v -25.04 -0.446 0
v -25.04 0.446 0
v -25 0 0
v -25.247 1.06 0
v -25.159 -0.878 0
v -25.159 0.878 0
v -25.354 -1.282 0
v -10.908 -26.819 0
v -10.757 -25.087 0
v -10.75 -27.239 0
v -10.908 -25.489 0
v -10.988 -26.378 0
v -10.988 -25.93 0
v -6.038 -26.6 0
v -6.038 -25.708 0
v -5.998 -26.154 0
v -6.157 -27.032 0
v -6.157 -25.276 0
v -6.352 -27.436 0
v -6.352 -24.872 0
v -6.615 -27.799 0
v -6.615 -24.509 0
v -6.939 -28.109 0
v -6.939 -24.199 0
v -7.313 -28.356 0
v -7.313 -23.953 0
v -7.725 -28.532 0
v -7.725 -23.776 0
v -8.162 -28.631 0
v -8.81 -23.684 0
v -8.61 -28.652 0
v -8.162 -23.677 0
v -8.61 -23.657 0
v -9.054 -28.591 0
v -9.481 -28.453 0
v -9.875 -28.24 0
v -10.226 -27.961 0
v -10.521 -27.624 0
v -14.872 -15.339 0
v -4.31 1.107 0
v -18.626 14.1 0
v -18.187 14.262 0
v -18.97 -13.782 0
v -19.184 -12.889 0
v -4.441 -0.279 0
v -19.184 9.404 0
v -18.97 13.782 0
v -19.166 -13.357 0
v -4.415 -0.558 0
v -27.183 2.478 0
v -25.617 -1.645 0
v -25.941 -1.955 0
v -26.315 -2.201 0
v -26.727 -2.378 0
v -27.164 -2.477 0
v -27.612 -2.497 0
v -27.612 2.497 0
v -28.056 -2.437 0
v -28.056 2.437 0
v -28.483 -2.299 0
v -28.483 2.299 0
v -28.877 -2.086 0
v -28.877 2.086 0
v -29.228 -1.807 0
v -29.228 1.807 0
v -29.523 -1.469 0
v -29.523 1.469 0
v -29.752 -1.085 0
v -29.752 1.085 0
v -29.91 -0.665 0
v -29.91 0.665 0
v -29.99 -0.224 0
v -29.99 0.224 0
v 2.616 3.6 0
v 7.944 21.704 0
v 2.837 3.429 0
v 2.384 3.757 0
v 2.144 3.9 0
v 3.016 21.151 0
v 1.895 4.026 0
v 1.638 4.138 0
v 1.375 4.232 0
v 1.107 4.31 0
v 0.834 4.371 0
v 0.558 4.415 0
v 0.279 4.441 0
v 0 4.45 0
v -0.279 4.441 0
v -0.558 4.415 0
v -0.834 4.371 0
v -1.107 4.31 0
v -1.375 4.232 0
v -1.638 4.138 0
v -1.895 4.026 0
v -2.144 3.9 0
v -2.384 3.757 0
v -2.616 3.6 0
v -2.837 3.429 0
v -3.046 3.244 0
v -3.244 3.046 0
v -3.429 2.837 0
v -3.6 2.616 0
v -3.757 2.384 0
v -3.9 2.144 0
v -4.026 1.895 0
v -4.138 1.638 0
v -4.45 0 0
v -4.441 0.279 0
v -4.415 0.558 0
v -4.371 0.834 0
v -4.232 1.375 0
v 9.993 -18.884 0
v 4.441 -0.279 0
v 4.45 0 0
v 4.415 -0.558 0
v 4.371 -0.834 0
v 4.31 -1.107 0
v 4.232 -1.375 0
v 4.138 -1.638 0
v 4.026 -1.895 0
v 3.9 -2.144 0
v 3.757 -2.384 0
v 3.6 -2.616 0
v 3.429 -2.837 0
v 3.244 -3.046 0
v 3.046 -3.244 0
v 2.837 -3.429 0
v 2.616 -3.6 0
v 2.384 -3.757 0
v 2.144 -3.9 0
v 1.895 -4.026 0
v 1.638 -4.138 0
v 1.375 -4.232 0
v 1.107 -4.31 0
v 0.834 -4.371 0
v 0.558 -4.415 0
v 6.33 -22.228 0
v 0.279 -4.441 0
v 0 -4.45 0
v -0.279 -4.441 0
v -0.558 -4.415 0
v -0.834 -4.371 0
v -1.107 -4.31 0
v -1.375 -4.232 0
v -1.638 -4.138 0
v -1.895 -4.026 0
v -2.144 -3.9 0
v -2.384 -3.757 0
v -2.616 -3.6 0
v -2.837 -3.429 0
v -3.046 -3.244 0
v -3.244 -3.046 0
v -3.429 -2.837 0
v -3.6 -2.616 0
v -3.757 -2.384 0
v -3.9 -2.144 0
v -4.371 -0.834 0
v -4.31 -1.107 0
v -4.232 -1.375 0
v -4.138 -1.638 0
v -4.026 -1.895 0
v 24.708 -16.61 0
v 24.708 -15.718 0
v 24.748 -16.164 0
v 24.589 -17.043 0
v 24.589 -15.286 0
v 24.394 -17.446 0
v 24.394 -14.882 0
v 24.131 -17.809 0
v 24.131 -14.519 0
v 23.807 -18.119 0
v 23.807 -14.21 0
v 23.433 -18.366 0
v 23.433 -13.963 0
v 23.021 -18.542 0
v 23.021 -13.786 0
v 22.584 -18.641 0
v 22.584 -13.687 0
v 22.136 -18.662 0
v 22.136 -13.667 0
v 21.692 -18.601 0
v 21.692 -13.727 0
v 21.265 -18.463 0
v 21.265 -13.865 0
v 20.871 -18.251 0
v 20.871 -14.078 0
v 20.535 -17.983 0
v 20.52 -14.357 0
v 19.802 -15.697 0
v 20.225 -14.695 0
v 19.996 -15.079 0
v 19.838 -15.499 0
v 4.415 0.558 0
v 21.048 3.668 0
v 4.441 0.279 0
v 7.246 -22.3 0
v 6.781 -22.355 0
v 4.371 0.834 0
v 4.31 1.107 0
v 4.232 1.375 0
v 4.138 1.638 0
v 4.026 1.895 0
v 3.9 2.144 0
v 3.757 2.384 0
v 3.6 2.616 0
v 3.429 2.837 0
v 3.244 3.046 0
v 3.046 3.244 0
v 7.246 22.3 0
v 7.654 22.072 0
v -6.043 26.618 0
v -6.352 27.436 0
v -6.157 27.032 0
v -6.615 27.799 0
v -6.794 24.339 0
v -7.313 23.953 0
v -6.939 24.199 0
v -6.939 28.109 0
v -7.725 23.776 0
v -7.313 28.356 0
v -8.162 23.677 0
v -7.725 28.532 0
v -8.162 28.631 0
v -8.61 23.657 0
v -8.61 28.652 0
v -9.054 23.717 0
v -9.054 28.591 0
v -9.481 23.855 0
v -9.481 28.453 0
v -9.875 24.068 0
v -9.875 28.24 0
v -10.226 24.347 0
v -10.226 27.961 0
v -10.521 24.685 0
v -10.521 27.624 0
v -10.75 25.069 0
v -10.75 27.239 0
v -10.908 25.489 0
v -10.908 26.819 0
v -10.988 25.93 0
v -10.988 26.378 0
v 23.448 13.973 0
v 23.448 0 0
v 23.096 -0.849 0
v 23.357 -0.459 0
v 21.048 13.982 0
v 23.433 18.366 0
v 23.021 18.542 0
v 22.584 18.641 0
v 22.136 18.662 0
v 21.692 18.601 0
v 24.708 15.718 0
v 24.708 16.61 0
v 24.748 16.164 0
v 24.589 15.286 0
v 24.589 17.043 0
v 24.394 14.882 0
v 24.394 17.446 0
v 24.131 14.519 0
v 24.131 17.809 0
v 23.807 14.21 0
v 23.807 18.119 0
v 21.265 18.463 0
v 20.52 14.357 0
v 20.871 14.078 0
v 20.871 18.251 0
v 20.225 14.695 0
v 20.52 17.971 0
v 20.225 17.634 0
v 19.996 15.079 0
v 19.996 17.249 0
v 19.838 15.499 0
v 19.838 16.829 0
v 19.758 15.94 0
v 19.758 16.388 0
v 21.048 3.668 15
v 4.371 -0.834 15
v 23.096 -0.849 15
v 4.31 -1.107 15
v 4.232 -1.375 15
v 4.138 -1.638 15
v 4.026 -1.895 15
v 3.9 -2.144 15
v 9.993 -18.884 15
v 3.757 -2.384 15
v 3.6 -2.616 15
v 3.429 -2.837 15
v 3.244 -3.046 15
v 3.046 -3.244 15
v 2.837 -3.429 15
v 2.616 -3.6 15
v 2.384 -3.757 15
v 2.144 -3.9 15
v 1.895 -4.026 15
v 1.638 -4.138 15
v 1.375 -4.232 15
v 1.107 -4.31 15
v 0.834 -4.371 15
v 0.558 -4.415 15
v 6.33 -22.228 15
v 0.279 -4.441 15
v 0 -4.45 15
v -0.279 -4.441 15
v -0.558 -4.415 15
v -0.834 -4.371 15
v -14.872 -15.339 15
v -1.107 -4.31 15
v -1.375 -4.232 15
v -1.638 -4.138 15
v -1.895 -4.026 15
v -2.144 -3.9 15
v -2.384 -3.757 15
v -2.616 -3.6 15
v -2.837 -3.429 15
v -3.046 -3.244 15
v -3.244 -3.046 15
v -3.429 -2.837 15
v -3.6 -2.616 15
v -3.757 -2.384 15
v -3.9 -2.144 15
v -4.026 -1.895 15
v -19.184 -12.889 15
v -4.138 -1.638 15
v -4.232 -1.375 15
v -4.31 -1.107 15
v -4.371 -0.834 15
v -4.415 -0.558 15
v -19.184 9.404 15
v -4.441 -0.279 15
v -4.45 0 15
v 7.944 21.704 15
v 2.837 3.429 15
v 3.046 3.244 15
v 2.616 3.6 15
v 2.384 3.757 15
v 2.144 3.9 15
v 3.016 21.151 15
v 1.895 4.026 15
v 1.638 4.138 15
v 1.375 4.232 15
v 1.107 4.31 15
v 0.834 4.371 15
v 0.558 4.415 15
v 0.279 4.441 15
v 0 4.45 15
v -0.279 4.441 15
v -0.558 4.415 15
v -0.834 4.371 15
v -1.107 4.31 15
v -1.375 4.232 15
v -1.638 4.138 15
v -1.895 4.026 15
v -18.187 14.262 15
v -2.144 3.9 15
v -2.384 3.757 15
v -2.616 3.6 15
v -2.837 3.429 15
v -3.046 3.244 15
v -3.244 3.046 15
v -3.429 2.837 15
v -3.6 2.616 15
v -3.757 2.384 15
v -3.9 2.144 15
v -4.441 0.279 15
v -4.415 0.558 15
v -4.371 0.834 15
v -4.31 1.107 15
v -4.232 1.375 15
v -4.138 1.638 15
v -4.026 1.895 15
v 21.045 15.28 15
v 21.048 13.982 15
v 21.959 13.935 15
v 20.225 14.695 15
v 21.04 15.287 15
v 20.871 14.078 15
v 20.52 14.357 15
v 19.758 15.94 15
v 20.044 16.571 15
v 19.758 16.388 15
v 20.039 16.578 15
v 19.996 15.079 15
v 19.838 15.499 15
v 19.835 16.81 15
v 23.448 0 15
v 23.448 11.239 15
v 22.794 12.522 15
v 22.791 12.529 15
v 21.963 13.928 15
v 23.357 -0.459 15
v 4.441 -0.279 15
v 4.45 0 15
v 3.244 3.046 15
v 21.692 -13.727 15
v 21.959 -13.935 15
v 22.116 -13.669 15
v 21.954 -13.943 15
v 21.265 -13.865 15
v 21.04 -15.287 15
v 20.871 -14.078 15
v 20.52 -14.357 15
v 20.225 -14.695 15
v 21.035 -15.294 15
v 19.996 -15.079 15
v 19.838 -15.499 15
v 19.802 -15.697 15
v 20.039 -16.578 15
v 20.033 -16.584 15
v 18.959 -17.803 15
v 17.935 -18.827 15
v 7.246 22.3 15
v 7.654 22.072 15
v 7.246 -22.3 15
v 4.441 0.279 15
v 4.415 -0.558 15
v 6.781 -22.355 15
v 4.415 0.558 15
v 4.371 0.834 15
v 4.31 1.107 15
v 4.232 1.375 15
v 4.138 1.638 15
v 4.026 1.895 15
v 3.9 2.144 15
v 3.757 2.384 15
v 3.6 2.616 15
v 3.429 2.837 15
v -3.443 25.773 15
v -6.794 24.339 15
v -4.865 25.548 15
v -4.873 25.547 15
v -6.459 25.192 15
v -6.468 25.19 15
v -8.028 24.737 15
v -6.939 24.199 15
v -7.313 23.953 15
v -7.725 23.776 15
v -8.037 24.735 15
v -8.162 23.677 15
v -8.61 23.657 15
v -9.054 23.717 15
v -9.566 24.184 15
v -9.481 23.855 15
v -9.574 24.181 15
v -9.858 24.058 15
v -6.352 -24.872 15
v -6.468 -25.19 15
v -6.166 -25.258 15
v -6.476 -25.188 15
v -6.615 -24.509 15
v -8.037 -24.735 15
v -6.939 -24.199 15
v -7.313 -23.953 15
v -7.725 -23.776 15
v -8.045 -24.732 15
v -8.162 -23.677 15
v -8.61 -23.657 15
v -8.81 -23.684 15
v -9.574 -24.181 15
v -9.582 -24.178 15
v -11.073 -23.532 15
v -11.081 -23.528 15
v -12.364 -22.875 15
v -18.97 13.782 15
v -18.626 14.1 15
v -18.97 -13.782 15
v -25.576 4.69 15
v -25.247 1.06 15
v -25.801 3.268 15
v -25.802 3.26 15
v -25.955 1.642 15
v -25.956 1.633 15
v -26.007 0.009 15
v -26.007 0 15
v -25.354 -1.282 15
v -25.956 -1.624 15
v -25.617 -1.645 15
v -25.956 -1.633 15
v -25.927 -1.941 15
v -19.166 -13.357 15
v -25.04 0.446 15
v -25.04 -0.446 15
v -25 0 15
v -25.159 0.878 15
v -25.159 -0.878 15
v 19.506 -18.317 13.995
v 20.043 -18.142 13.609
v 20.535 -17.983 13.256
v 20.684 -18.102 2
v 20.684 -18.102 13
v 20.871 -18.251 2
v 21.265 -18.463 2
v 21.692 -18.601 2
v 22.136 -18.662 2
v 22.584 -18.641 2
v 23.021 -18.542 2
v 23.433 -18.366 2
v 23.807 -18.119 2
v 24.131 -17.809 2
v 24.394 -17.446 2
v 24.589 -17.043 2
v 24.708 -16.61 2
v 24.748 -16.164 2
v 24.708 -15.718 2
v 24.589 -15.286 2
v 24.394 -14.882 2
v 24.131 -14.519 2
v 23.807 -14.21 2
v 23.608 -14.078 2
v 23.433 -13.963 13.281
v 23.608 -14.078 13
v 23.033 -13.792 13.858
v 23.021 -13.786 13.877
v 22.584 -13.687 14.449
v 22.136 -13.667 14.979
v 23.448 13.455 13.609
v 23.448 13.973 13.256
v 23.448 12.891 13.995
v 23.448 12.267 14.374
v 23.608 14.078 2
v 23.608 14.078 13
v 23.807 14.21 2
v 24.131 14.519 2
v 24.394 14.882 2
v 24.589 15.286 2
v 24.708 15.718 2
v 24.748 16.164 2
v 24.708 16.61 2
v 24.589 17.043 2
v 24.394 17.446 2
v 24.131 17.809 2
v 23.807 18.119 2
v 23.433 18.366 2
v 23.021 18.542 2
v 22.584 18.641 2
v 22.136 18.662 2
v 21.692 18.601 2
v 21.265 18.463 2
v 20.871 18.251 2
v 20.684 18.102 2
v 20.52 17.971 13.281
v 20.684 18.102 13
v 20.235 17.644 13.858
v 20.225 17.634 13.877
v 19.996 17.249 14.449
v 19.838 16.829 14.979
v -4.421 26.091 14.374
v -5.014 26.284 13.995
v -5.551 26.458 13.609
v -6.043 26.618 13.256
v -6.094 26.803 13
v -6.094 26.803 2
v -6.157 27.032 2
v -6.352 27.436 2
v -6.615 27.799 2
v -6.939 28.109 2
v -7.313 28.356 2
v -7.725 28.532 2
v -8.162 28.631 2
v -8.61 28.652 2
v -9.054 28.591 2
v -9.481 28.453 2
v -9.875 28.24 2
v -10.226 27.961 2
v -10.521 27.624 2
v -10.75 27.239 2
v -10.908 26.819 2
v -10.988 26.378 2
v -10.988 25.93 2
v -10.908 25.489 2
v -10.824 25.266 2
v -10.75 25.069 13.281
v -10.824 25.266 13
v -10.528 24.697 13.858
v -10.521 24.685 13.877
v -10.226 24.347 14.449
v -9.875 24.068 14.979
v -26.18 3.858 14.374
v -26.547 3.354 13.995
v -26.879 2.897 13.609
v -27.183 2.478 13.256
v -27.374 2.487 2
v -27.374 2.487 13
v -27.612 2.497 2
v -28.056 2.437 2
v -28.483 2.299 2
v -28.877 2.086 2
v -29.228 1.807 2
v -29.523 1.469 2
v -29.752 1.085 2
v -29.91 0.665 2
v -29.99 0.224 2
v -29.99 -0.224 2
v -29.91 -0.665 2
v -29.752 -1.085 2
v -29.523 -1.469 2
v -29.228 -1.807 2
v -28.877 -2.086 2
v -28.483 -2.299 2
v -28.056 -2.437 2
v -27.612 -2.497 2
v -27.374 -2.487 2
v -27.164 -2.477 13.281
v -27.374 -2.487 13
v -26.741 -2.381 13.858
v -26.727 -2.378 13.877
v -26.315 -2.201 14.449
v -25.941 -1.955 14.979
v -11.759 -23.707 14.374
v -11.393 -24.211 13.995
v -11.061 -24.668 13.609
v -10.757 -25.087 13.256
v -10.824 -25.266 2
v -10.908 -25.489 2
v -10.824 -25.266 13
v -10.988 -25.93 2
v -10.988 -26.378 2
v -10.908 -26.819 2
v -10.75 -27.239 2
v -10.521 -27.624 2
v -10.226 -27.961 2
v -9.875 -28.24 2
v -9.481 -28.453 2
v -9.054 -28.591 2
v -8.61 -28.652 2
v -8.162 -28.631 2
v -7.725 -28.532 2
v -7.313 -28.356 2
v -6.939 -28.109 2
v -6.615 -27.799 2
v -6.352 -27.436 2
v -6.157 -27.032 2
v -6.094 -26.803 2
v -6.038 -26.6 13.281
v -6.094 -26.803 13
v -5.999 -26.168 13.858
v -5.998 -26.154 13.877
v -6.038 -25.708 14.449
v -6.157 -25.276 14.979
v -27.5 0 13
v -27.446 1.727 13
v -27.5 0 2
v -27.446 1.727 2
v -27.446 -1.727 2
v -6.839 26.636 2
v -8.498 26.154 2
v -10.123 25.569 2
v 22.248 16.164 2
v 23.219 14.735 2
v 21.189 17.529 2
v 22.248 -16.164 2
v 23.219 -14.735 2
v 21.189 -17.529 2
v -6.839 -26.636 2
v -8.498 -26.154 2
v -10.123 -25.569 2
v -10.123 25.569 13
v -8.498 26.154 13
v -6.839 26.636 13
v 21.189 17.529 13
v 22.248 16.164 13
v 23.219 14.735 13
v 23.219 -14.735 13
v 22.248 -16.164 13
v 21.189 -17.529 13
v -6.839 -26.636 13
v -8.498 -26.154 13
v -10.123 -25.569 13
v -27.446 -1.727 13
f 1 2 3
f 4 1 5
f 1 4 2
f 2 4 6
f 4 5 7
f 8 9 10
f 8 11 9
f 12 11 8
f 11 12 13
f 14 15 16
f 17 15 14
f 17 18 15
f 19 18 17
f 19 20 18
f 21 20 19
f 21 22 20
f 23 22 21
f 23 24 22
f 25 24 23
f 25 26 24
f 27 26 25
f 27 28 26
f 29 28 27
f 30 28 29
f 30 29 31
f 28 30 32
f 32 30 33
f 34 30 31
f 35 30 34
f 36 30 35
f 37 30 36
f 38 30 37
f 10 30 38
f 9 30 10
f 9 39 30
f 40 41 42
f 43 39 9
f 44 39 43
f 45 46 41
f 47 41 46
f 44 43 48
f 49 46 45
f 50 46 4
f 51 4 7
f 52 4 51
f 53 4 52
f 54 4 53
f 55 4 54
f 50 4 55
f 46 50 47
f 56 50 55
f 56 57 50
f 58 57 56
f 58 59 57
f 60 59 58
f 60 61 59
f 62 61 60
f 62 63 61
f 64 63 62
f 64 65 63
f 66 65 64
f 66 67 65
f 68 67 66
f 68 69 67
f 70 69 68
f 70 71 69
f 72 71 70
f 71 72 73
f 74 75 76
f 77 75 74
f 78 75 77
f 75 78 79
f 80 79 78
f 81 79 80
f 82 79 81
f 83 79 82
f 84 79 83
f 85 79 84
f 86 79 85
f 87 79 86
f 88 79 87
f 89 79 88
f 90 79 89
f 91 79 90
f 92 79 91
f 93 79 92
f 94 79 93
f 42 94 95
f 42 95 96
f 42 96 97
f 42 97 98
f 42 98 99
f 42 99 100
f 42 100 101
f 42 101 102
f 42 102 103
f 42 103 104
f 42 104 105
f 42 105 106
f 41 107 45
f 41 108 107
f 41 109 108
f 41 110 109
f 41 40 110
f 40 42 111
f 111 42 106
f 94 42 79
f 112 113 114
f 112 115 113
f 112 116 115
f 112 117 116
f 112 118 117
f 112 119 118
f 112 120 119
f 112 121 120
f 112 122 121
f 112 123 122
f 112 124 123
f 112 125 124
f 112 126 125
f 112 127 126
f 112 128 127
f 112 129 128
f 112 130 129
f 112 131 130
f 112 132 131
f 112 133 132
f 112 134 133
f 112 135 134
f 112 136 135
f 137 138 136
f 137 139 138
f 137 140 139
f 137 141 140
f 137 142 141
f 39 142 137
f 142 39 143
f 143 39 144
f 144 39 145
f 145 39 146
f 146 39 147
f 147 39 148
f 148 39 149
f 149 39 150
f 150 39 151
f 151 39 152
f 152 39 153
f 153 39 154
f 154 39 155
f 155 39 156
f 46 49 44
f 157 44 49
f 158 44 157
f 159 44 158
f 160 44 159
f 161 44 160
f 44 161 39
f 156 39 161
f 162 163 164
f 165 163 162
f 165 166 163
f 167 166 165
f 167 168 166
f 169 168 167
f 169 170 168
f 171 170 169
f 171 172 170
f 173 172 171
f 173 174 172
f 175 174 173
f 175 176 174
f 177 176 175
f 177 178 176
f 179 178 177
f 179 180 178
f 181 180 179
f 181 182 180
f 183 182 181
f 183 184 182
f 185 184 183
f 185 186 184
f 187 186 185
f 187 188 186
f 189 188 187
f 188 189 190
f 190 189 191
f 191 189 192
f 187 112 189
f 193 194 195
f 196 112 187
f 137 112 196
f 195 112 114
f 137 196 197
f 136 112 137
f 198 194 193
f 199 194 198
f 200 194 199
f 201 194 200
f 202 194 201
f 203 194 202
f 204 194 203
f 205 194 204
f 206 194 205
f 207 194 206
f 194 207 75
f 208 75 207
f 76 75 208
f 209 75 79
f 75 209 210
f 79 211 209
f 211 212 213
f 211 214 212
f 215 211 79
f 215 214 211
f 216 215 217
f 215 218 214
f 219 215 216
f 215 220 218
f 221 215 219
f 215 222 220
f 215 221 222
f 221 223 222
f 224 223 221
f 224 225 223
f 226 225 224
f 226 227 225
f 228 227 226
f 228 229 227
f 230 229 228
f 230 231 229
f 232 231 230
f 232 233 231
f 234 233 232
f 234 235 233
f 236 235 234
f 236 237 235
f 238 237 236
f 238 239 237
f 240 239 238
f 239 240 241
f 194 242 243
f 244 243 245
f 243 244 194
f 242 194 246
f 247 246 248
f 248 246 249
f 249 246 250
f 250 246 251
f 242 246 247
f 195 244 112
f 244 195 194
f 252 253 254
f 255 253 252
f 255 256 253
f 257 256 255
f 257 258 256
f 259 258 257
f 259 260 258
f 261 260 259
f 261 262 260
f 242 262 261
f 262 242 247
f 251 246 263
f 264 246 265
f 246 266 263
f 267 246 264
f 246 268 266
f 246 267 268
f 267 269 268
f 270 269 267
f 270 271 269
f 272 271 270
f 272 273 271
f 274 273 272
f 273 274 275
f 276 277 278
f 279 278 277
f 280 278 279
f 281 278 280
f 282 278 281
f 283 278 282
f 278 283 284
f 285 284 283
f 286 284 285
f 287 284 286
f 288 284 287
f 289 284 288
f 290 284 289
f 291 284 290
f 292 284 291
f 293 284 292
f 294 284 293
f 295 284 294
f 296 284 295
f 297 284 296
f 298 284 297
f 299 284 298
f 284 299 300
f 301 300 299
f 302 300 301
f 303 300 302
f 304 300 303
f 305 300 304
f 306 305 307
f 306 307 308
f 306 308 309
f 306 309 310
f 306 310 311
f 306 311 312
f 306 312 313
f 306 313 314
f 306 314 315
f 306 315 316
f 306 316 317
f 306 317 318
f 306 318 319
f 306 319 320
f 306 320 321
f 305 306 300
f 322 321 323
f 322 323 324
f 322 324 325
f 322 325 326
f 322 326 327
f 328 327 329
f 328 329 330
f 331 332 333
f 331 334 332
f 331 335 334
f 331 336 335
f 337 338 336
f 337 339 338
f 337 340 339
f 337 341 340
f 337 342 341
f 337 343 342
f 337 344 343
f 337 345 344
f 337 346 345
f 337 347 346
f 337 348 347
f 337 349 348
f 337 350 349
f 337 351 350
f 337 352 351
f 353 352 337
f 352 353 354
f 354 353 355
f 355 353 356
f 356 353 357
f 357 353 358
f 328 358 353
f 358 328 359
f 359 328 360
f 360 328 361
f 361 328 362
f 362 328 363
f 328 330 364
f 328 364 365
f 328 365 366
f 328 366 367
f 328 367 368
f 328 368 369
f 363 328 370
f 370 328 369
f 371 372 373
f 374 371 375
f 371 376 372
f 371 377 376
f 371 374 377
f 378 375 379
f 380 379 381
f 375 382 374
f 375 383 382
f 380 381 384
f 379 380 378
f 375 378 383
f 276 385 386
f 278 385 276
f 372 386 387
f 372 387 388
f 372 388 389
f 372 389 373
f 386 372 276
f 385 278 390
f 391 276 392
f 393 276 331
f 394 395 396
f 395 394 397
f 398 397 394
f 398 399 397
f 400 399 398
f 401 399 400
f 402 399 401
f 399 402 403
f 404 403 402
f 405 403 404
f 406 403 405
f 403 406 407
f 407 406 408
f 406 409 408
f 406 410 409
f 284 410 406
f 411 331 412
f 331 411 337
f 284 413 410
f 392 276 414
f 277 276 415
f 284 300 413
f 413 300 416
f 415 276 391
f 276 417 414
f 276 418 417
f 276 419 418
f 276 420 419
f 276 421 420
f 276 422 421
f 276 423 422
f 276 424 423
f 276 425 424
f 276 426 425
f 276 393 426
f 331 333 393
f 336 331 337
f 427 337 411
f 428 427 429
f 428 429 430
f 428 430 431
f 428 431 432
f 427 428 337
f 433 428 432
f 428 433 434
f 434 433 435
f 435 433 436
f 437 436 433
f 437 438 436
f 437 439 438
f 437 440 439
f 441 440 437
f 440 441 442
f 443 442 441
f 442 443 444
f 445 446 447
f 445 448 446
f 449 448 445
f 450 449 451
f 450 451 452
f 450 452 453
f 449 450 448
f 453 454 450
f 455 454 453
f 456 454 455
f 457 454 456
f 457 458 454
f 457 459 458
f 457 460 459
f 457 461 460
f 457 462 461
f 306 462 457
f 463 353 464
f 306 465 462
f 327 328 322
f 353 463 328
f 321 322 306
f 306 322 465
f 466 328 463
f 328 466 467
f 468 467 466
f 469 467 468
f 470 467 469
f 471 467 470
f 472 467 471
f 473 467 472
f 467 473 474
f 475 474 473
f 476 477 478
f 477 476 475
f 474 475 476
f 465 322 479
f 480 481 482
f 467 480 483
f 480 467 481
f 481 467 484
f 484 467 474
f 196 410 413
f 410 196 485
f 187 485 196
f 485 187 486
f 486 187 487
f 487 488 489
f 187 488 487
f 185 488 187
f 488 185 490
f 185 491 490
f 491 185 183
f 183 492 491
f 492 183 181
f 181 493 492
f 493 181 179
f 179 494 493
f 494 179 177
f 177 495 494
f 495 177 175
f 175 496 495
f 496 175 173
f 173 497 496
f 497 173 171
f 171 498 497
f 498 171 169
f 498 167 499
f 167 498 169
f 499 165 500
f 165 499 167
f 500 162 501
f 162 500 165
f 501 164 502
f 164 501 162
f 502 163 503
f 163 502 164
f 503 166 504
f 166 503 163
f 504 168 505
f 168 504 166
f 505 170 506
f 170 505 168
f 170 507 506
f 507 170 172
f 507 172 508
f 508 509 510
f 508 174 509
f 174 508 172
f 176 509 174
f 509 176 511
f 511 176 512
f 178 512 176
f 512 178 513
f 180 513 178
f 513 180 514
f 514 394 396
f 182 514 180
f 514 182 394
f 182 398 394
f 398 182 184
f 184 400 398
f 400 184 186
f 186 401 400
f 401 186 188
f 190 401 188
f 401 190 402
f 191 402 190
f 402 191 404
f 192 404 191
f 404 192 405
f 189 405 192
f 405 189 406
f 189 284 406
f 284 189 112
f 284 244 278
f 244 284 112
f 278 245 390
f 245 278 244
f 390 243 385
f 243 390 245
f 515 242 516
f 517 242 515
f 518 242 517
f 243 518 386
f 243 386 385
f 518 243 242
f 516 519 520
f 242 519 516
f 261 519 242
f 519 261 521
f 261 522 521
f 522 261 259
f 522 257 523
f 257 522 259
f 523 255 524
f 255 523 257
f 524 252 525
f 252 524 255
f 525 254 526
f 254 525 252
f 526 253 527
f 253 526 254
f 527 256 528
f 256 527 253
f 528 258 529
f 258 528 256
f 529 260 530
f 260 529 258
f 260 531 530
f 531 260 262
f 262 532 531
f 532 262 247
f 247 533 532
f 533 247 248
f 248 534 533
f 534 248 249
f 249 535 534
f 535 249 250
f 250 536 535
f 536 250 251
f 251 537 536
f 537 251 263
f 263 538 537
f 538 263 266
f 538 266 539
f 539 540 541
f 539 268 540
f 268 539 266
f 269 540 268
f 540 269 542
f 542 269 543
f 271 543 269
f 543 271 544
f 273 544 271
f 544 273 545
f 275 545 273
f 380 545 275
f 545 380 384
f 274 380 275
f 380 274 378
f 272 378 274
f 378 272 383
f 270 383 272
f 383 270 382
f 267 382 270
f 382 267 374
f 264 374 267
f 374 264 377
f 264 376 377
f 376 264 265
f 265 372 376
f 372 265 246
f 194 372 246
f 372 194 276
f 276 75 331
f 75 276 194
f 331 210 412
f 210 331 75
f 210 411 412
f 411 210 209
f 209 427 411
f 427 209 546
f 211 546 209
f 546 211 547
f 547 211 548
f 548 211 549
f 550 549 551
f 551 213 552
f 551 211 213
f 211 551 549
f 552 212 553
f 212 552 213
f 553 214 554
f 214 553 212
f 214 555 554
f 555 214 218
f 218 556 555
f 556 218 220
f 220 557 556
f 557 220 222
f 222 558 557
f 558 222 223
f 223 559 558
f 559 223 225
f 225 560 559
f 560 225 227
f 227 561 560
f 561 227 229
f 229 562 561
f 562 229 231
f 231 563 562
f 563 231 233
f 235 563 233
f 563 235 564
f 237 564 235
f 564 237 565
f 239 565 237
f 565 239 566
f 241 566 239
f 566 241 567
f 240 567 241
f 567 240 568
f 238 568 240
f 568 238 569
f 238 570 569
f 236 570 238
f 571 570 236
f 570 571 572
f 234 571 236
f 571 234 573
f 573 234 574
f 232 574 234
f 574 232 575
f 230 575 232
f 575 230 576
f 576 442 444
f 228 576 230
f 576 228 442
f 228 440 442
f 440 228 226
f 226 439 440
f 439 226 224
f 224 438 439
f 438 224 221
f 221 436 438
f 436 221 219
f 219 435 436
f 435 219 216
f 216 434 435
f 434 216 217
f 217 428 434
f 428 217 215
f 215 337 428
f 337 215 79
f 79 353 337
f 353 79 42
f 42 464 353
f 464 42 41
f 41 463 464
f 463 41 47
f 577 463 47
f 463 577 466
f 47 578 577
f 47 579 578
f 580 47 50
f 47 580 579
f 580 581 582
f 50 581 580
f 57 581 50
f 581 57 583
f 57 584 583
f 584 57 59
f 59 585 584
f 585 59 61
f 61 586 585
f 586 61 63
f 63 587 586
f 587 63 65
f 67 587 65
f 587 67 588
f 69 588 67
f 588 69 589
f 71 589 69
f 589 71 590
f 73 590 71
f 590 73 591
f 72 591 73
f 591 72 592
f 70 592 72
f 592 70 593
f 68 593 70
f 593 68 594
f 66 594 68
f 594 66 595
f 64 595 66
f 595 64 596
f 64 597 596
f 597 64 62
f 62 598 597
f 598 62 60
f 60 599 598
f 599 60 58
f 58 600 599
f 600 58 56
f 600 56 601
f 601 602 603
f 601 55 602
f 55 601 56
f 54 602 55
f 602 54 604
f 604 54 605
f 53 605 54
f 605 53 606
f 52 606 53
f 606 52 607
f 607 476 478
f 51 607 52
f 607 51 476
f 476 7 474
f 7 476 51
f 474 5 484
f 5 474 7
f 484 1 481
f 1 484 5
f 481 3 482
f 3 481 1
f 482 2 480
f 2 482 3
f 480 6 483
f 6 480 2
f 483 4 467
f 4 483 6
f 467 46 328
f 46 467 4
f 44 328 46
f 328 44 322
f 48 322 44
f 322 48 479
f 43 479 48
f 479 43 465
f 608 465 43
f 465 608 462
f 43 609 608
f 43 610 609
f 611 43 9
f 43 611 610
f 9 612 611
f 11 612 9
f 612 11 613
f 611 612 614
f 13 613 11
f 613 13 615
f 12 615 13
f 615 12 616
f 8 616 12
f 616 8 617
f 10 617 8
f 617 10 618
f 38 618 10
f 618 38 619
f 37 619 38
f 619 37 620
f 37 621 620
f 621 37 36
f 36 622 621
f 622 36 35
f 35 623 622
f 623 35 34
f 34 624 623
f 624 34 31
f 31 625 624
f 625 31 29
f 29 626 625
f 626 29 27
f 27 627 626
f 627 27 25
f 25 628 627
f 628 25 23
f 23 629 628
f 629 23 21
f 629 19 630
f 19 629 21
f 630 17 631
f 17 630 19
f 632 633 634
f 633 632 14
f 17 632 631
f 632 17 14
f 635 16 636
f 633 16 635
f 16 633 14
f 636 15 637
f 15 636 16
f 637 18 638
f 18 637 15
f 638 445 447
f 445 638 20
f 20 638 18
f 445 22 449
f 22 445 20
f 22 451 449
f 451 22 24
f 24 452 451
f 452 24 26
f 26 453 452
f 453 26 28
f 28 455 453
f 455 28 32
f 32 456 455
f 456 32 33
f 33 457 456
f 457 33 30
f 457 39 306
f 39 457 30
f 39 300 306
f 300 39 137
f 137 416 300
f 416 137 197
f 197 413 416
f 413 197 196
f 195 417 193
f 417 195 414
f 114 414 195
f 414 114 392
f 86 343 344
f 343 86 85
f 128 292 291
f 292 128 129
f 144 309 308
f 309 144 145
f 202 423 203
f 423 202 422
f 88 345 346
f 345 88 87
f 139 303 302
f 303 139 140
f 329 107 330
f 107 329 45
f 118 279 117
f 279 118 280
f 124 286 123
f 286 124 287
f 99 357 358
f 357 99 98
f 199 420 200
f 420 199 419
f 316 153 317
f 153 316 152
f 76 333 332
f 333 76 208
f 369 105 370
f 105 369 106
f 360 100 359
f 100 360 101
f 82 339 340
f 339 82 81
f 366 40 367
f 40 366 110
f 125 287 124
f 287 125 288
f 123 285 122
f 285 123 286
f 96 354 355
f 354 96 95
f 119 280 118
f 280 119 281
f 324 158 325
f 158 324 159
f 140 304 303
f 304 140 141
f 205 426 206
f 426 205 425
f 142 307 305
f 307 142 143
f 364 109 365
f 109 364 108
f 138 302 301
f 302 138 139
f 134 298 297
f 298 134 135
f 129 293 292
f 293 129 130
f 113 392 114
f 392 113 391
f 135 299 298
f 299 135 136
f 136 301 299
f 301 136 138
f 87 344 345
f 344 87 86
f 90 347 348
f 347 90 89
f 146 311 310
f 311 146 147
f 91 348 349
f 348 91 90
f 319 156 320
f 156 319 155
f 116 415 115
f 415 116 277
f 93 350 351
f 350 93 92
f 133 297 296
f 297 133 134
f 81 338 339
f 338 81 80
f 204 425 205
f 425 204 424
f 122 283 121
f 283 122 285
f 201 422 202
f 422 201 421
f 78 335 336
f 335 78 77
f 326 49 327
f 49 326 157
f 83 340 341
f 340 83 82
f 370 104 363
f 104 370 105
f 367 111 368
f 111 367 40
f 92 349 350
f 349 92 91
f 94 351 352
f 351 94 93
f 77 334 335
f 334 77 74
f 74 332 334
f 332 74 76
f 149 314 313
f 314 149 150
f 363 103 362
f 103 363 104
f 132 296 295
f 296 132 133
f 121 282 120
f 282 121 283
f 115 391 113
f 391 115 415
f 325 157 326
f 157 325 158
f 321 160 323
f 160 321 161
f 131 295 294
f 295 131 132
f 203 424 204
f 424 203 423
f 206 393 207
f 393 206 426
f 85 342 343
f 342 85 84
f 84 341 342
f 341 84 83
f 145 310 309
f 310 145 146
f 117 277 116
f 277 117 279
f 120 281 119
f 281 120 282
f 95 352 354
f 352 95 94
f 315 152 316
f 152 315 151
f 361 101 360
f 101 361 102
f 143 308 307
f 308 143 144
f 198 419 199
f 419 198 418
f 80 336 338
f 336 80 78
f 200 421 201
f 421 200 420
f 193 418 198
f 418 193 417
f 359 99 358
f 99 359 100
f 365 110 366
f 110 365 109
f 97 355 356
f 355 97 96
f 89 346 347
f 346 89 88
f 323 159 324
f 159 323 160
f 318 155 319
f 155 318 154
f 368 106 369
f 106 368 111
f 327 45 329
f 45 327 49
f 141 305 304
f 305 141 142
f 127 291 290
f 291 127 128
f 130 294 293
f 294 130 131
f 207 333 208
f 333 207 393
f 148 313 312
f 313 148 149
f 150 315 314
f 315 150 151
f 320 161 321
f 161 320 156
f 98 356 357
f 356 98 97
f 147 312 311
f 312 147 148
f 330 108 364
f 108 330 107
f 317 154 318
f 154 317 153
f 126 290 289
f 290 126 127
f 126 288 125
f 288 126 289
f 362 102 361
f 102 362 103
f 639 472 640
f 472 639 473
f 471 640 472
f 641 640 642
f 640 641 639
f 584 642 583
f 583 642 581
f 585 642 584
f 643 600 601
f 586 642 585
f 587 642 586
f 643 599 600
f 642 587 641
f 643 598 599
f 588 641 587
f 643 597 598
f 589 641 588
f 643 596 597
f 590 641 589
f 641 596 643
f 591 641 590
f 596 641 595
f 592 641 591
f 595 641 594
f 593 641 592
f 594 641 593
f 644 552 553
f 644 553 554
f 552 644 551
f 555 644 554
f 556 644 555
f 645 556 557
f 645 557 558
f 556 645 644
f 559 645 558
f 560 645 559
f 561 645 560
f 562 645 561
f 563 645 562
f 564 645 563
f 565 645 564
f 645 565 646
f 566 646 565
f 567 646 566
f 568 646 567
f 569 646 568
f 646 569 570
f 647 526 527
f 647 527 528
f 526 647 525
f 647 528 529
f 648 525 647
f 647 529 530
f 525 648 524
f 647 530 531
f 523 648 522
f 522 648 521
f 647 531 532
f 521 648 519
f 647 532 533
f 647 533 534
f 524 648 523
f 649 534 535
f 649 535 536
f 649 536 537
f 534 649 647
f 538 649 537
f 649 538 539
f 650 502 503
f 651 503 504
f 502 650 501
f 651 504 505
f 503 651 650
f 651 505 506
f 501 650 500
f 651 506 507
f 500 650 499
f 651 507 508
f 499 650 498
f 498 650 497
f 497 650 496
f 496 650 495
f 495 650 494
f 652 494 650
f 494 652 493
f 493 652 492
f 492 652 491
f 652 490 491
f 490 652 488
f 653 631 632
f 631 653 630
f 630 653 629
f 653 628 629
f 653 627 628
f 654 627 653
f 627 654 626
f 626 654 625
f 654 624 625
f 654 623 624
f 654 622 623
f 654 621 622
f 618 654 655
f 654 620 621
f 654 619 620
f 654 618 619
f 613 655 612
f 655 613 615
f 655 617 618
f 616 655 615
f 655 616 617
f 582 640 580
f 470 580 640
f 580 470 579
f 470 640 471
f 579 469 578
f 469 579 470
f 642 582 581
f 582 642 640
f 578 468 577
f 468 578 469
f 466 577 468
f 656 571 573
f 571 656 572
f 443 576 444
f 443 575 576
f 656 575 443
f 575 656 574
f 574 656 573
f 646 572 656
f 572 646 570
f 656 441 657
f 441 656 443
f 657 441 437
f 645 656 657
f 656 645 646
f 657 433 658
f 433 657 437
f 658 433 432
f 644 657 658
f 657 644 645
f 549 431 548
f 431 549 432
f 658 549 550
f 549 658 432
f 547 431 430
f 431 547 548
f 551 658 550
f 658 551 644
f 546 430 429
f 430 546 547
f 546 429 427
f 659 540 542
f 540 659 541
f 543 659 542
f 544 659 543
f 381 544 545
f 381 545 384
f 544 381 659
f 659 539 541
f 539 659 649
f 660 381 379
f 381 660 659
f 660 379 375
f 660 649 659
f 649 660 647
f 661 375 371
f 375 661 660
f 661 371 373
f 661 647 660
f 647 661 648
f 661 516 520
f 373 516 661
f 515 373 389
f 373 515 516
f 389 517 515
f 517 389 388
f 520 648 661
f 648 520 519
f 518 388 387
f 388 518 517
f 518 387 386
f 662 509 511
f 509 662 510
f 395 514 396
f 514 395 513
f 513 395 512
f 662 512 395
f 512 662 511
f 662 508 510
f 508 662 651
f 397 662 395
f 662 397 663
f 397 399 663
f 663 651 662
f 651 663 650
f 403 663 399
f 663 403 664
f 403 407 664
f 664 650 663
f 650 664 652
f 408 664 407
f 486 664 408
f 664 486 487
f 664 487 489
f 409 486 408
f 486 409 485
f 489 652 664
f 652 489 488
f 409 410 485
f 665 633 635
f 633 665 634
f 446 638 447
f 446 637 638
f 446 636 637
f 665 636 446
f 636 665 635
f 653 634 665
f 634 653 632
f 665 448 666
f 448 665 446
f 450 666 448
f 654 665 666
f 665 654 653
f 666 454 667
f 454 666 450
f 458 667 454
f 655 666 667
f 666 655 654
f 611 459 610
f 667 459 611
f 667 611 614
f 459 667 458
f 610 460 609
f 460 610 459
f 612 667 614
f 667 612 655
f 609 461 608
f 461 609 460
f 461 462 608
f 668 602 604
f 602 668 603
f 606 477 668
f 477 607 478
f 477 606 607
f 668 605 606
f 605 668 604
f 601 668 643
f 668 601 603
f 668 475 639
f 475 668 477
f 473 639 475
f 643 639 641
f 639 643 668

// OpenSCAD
// 'Customizable Spool Adapter' by wstein 
// is licensed under the Attribution - Non-Commercial - Share Alike license. 
// Version 1.3.1 (c) November 2015
// please refer the complete license here: http://creativecommons.org/licenses/by-sa/3.0/legalcode
//
// V1.4: inner hole fix (see http://www.thingiverse.com/thing:1151473)
// V1.3.1: Bug fixed for latest customizer
// V1.3: Customizer creation failure fixed. Some smaller issues fixed. More slider used. New license cc-by-sa!
// V1.2: part handling optimized
// V1.1a: UI optimized
// V1.1: new star shape

// preview[view:south, tilt:top diagonal]

//to show. This setting is only relevant for preview.
part="right"; //[right:Right,left:Left,straight:Straight,star_right:Star Right,star_left:Star Left]

//depended on the inner and outer diameter, you may also need to change the "Arms" settings to get a perfect working adapter. 
tube_diameter=7.9; //[0:0.5:75]
spool_diameter=53; //[0:1:150]
height=15; //[0:100]
number_of_arms=5; //[3:10]
function get_number_of_arms() = (part == "straight" && number_of_arms % 2 > 0 ? 1 : 0) + number_of_arms;

/*[Advanced]*/

inner_diameter_backlash=1.0; //[0:0.1:5]
collar_thickness=2.0; //[0:0.5:10]
chamfer_depth=2.0; //[0:0.5:20]
wall=3.0; //[0:0.1:10]

/*[Arms]*/

//I used 2mm on 32/53 Adapter with 6 arms and 2.4mm with 5 arms. It depends on the length.
arm_thickness=2.4; //[0:0.1:5]
//in mm. The adapter should fit tight to the spool, so the outer diameter is enlarged by this value.
arm_compression=2.0; //[0:0.1:5]
// in mm
arm_end_diameter=5.0; //[0:0.5:20]

/*[Expert]*/
quality=100; //[60:Normal,80:Good,100:High]

function get_part_index() = search([part], ["right","left","straight","star_right","star_left"])[0];

/*[Hidden]*/


inner_diameter=tube_diameter+inner_diameter_backlash;
outer_diameter=spool_diameter+arm_compression;

outer_shape=[

    [outer_diameter/2+arm_end_diameter+.1,collar_thickness],
    [outer_diameter/2,collar_thickness],
    [outer_diameter/2,height-chamfer_depth],
    [spool_diameter/2-.5,height+0.01],
    [outer_diameter/2+arm_end_diameter+.1,height+0.01],
];

number=part == "straight"?get_number_of_arms()/2:get_number_of_arms();

arm_degree=360/get_number_of_arms();
degree=360/number;

difference()
{   
    linear_extrude(convexity=20,height=height)
    union()
    {
        if(get_part_index()>2)
        for(a=[0:degree:359])
        hull()
        {
            circle(r=inner_diameter/2+wall,$fn=quality);
            
            rotate([0,0,a])
            translate([cos_arm,0,0])
            circle(r=arm_thickness/2,$fn=arm_thickness*7);
        }
        else
        hull()
        {
            circle(r=inner_diameter/2+wall,$fn=quality);
            
            for(a=[0:degree:359])
            rotate([0,0,a])
            translate([cos_arm,0,0])
            circle(r=arm_thickness/2,$fn=arm_thickness*7);
        }
        
        for(a=[0:degree:359])
        rotate([0,0,a])
        for(i=[0:len(arm_paths[get_part_index()])-2])
        hull()
        for(j=[i:i+1])
        translate(arm_paths[get_part_index()][j])
        circle(r=arm_thickness/2,$fn=arm_thickness*7);
        
        for(a=[0:360/get_number_of_arms():359])
        rotate([0,0,a])
        translate([cos_arm,sin_arm])
        circle(r=arm_end_diameter/2,$fn=arm_end_diameter*7);       
    }
    
    translate([0,0,-1])
    cylinder(r=inner_diameter/2, h=height+2, $fn=quality);

    rotate_extrude(convexity=20,$fn=quality)
    polygon(outer_shape);
}

sin_arm=sin(arm_degree/2)*outer_diameter/2;
cos_arm=cos(arm_degree/2)*outer_diameter/2;
arm_paths=[
    // right
    [
        [cos_arm,0],
        [cos_arm,sin_arm],
    ],
    // left
    [
        [cos_arm,0],
        [cos_arm,-sin_arm],
    ],
    // straight
    [
        [cos_arm,sin_arm],
        [cos_arm,-sin_arm],
    ],
    // right star
    [
        [cos_arm,0],
        [cos_arm,sin_arm],
    ],
    // left star
    [
        [cos_arm,0],
        [cos_arm,-sin_arm],
    ],
];
